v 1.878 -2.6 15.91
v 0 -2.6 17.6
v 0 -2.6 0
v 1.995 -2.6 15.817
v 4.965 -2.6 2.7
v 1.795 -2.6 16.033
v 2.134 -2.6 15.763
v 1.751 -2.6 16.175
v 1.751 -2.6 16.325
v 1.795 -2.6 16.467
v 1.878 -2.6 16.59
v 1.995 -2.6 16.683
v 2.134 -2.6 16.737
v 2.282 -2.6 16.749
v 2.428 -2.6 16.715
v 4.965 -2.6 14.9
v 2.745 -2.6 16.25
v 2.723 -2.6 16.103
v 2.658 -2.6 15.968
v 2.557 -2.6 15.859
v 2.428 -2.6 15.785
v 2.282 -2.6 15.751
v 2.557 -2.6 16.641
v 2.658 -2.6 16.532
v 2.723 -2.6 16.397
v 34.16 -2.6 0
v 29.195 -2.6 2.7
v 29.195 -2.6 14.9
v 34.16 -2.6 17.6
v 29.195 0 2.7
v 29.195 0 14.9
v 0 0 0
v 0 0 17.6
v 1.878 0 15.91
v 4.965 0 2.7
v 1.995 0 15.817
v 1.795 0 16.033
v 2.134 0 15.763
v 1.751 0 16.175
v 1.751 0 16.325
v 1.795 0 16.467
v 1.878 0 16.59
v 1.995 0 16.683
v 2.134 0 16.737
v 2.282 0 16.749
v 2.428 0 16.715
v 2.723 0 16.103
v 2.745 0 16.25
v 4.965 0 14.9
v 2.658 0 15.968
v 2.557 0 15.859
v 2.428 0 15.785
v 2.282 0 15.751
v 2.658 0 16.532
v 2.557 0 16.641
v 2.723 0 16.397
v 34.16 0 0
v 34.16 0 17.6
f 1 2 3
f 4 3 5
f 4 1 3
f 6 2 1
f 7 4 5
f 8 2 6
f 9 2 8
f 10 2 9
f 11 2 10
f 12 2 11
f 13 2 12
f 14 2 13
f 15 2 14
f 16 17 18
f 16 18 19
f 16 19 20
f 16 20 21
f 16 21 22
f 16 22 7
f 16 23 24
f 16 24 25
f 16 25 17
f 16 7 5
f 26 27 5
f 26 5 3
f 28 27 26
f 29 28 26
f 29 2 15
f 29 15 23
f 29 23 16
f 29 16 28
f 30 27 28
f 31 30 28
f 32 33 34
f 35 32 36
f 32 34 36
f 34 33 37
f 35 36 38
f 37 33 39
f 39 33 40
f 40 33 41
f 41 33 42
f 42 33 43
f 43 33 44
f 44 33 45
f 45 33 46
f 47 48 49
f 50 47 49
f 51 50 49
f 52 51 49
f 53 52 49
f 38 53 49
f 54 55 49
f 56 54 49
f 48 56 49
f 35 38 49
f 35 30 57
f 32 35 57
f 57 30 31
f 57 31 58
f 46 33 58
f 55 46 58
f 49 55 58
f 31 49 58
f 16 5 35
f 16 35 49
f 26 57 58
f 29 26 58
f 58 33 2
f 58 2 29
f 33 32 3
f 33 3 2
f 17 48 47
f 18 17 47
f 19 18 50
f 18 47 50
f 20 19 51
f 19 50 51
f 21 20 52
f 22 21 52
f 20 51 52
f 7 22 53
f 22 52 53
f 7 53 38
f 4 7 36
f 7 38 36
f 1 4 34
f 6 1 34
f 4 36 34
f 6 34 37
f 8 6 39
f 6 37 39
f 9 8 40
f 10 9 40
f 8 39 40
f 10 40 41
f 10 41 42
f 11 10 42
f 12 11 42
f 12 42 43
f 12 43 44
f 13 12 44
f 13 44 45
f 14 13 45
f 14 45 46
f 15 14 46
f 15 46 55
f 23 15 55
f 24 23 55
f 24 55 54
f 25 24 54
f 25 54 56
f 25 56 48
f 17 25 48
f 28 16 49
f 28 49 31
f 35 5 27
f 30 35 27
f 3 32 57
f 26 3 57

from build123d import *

# Parameters (mm, degrees)
SKETCH_W        = 34.16
SKETCH_H        = 17.6
PAD_DEPTH       = 2.6
SKETCH002_W     = 24.23
SKETCH002_H     = 12.2
POCKET_DEPTH    = 2.6
SKETCH003_R     = 0.5
SKETCH003_W     = 2.01
SKETCH003_H     = 3.5
POCKET001_DEPTH = 5


with BuildPart() as part:
    # Sketch → Pad (new body)
    with BuildSketch(Plane.XZ):
        with Locations((17.08, 8.8)):
            Rectangle(SKETCH_W, SKETCH_H)
    extrude(amount=PAD_DEPTH)

    # Sketch002 (on Face6 of Pad) → Pocket (cut)
    with BuildSketch(Plane.XZ.offset(2.6)):
        with Locations((17.08, 8.8)):
            Rectangle(SKETCH002_W, SKETCH002_H)
    extrude(amount=-POCKET_DEPTH, mode=Mode.SUBTRACT)

    # Sketch003 (on Face4 of Pocket) → Pocket001 (cut)
    with BuildSketch(Plane(origin=(0, 0, 0), x_dir=(1, 0, 0), z_dir=(0, 1, 0))):
        with Locations((2.245, -16.25)):
            Circle(SKETCH003_R)
        with Locations((27.953742, -8.544061)):
            Rectangle(SKETCH003_W, SKETCH003_H)
    extrude(amount=-POCKET001_DEPTH, mode=Mode.SUBTRACT)


solid = part.part
